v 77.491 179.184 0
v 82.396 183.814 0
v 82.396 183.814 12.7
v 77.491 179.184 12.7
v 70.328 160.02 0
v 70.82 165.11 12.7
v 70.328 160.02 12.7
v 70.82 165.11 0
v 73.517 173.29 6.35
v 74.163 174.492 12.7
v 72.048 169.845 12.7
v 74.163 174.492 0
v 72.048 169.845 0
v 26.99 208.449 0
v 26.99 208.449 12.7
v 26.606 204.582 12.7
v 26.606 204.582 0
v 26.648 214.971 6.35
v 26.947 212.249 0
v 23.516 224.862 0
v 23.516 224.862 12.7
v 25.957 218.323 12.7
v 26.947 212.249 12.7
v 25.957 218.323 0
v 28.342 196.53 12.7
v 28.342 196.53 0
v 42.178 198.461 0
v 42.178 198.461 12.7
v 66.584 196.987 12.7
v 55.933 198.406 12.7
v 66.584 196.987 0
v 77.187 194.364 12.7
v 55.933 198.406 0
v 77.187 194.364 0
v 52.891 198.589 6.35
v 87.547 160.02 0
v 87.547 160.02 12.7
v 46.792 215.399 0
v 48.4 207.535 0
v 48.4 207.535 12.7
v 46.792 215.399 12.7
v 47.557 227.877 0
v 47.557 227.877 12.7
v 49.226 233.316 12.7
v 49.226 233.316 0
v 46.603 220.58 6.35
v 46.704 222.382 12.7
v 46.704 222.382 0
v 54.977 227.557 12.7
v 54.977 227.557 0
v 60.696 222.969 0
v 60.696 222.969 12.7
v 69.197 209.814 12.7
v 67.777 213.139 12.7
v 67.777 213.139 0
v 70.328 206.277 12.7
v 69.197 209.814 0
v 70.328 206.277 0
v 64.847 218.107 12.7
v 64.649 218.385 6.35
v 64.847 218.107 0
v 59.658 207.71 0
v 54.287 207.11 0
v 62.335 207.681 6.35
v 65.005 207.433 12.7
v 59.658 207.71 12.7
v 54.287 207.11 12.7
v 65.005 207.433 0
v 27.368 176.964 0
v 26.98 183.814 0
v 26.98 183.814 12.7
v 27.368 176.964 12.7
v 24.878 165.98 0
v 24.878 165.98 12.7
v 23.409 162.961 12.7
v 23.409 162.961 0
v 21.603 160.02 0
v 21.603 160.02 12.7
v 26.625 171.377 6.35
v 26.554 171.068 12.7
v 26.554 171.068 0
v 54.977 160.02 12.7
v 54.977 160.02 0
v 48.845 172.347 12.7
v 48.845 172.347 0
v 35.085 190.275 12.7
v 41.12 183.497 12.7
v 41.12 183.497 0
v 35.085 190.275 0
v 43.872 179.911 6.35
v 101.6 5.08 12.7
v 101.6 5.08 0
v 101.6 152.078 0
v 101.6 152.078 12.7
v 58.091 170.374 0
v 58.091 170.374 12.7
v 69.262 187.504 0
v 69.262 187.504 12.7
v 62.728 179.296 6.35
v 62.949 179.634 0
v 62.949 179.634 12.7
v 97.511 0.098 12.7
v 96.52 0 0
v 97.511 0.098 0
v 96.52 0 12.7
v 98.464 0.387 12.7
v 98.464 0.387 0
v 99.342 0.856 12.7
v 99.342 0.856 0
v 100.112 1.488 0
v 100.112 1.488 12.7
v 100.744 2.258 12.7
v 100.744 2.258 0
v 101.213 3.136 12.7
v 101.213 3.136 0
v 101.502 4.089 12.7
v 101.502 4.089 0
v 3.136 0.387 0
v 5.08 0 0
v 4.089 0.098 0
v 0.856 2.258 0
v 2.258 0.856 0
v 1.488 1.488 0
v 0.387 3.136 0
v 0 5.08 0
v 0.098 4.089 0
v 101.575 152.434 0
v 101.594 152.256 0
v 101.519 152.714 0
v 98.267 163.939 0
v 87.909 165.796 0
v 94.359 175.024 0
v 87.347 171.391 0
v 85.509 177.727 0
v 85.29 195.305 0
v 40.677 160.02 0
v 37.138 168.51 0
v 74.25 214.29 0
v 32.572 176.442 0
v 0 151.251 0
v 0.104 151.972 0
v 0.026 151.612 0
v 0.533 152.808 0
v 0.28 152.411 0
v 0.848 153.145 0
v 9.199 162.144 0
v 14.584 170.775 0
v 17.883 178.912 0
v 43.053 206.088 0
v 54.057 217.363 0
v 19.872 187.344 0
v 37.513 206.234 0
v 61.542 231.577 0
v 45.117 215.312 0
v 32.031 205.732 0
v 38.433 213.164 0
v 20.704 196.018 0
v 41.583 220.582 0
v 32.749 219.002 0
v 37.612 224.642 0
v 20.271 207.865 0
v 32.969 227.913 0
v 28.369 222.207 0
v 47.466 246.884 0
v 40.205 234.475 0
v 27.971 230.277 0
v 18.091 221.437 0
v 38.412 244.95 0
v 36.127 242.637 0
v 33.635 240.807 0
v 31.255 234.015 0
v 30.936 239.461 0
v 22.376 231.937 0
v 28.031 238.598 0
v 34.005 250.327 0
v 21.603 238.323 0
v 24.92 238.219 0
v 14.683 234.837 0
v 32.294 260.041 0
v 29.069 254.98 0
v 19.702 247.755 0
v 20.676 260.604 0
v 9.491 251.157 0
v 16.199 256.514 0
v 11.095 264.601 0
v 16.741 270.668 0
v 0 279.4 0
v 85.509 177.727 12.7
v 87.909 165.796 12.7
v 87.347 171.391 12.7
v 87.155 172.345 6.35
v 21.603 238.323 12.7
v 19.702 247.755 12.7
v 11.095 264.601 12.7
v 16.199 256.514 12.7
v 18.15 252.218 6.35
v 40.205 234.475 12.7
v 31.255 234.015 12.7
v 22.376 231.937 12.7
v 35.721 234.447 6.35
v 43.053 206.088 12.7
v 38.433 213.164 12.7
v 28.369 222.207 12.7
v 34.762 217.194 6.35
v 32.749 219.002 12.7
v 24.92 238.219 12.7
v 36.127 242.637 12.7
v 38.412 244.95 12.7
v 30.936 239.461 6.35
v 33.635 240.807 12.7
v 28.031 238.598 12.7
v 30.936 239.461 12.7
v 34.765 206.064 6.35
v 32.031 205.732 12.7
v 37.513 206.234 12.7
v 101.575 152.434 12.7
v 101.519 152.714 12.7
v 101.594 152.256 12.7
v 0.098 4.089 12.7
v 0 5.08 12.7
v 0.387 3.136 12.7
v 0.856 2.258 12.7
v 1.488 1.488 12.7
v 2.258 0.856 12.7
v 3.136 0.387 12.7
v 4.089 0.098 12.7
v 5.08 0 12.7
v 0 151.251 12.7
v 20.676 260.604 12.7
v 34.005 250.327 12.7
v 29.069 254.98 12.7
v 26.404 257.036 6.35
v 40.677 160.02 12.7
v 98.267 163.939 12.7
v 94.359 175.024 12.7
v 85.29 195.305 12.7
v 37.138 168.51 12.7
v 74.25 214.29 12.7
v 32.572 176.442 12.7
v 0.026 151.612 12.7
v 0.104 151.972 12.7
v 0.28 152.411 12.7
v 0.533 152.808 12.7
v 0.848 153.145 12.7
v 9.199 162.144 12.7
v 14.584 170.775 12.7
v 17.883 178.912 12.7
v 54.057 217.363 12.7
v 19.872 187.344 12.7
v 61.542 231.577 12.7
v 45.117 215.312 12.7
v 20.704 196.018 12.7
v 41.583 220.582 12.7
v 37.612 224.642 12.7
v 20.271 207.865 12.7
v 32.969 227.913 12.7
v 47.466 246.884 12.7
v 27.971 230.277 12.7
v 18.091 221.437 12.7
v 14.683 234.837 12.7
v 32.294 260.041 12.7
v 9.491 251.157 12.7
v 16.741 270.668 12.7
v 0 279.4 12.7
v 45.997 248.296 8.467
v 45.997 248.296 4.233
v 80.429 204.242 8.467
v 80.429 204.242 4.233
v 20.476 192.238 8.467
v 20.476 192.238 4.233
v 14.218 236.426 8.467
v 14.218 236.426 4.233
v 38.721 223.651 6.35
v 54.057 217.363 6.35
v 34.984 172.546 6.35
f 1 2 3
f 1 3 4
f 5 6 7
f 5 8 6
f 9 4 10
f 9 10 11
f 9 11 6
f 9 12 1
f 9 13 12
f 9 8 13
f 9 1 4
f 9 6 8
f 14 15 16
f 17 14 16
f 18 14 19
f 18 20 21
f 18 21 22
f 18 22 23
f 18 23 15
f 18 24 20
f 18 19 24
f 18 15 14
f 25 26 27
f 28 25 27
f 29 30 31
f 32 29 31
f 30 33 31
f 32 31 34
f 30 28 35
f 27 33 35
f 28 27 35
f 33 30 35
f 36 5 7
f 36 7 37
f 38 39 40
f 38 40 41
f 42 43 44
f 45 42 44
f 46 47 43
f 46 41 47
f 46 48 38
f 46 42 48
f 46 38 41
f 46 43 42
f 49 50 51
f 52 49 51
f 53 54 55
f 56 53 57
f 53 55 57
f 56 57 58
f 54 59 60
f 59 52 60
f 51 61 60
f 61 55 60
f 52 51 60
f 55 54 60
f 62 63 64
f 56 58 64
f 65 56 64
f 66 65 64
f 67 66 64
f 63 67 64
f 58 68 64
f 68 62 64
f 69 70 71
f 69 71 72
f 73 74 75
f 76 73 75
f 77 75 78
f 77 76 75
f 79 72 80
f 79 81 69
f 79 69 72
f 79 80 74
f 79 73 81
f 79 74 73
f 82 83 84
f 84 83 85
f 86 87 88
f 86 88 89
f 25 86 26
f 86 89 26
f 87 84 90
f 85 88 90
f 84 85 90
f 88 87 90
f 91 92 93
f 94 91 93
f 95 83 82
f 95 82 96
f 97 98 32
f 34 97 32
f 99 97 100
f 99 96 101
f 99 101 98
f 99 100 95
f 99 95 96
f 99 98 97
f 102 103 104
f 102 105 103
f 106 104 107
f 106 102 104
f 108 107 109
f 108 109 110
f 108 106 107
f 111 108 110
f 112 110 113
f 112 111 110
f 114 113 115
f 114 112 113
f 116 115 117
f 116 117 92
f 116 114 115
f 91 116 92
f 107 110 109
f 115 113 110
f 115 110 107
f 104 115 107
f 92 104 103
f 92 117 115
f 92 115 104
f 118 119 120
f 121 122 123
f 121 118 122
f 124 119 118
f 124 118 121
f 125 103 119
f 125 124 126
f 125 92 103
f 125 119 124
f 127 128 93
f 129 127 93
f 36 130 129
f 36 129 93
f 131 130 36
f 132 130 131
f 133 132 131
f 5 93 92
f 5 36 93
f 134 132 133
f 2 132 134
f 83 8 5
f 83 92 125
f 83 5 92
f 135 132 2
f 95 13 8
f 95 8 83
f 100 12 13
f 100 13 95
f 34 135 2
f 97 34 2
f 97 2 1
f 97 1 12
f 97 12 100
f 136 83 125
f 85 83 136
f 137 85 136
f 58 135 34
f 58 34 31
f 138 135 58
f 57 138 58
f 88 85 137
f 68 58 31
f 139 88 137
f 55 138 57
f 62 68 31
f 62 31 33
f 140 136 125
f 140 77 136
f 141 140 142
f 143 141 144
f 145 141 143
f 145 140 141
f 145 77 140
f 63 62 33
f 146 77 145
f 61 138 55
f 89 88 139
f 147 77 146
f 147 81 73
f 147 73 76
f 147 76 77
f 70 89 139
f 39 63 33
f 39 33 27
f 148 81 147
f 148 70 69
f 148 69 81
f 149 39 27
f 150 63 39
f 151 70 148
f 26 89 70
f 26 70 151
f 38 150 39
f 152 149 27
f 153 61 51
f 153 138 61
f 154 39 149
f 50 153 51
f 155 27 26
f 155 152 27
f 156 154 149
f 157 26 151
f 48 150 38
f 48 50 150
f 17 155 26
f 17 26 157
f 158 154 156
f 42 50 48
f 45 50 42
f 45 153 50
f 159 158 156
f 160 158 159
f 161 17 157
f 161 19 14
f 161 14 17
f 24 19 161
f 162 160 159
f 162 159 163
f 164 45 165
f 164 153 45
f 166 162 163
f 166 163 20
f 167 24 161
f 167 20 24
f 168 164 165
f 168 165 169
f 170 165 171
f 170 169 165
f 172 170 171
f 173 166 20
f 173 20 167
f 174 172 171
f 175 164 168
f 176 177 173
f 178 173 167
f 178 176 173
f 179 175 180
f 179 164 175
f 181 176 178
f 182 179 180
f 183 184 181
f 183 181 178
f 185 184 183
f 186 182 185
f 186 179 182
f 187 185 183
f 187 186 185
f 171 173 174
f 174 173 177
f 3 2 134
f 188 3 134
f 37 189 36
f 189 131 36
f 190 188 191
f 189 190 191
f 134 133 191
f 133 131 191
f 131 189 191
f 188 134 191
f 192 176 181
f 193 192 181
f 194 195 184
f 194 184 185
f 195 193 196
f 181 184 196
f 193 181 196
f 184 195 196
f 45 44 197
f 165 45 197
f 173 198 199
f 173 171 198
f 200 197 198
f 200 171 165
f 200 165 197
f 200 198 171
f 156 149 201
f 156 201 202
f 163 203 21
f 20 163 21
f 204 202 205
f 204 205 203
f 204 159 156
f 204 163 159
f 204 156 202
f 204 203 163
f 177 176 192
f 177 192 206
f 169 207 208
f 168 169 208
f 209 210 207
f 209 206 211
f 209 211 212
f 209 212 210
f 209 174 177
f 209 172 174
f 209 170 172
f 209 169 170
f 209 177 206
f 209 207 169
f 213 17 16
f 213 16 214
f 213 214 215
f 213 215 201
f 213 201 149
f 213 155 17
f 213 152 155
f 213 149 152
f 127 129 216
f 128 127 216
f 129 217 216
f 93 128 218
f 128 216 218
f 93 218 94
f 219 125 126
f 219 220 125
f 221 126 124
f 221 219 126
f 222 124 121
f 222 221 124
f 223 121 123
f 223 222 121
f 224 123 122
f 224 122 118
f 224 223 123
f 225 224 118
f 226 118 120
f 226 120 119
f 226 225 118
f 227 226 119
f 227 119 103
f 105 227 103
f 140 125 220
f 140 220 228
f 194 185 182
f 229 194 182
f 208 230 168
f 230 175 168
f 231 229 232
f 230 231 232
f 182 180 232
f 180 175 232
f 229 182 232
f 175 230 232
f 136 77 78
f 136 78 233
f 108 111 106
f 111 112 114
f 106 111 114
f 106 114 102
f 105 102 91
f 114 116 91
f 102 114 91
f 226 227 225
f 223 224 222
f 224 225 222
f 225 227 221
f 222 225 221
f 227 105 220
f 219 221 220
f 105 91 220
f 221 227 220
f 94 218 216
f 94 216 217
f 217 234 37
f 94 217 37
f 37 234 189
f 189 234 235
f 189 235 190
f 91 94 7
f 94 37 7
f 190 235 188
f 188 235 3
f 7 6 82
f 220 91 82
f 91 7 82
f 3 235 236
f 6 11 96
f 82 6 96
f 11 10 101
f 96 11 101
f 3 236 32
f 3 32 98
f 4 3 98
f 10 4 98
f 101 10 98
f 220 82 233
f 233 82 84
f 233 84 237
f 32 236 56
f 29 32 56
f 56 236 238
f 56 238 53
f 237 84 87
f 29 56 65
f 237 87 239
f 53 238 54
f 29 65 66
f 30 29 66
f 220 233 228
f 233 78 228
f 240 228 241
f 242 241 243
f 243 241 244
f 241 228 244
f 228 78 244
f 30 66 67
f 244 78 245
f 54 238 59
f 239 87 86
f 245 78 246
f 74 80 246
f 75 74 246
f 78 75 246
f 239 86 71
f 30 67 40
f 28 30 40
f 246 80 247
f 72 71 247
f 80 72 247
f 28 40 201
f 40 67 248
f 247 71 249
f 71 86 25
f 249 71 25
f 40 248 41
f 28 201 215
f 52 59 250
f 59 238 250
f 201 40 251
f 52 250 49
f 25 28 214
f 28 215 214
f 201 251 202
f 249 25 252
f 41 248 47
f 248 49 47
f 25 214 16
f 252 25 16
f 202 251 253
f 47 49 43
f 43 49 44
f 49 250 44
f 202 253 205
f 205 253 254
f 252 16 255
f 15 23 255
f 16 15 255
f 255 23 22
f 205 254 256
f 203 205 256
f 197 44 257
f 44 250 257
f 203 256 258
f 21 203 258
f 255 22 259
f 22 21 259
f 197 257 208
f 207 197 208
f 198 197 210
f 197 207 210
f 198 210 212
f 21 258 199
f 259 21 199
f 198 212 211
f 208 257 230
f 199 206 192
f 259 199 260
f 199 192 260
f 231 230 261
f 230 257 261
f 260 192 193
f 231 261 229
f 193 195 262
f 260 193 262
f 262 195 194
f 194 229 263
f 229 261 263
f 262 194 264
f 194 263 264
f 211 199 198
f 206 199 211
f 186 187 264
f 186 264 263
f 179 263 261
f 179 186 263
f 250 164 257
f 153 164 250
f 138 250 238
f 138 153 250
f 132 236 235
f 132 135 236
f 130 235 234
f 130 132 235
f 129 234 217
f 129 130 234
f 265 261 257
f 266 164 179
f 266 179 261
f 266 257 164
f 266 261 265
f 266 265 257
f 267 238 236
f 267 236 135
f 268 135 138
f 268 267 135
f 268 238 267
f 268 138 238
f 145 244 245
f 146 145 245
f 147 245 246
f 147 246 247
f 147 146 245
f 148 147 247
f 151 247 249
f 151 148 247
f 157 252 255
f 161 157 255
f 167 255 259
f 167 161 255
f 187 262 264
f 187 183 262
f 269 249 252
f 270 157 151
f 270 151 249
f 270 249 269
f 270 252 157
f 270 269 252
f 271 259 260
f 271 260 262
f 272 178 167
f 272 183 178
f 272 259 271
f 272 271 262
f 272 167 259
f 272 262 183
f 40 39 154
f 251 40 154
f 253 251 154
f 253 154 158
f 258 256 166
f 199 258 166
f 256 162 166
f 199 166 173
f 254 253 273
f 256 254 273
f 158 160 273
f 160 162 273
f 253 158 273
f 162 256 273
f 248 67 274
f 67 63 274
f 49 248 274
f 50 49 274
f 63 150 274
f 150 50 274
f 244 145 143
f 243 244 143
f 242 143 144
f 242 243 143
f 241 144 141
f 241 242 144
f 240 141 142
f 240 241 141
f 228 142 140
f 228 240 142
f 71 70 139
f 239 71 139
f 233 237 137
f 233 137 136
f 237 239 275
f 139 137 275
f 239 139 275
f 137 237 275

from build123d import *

# Parameters (mm, degrees)
SKETCH1_W           = 101.6
SKETCH1_H           = 152.4
BOSS_EXTRUDE1_DEPTH = 12.7
BOSS_EXTRUDE3_DEPTH = 12.7
FILLET1_R           = 2.54
FILLET2_R           = 5.08


with BuildPart() as part:
    # Sketch1 → Boss-Extrude1 (new body)
    with BuildSketch(Plane.XY):
        with Locations((50.8, 76.2)):
            Rectangle(SKETCH1_W, SKETCH1_H)
    extrude(amount=BOSS_EXTRUDE1_DEPTH)

    # Sketch2 → Boss-Extrude3 (add)
    with BuildSketch(Plane.XY):
        with BuildLine():
            add(Edge.make_bspline(
                [(0, 152.4), (39.790111277, 186.839065643), (12.30975625, 238.845497073), (0, 279.4)],
                knots=[0, 0, 0, 0, 1, 1, 1, 1], degree=3))
            add(Edge.make_bspline(
                [(0, 279.4), (51.286050257, 256.550041835), (87.836892382, 205.957944637), (101.6, 152.4)],
                knots=[0, 0, 0, 0, 1, 1, 1, 1], degree=3))
            Line((101.6, 152.4), (0, 152.4))
        make_face()
        with BuildLine():
            add(Edge.make_bspline(
                [(49.225838487, 233.315766274), (35.641228944, 236.267866949), (22.375615267, 231.937259722)],
                knots=[0, 0, 0, 1, 1, 1], degree=2))
            add(Edge.make_bspline(
                [(48.400350721, 207.535437601), (42.054170901, 227.566198031), (22.375615267, 231.937259722)],
                knots=[0, 0, 0, 1, 1, 1], degree=2))
            add(Edge.make_bspline(
                [(48.400350721, 207.535437601), (44.393568943, 220.734513873), (49.225838487, 233.315766274)],
                knots=[0, 0, 0, 1, 1, 1], degree=2))
        make_face(mode=Mode.SUBTRACT)
        with BuildLine():
            add(Edge.make_bspline(
                [(43.05348098, 206.08803494), (36.239789994, 218.91266054), (23.516066372, 224.861937296)],
                knots=[0, 0, 0, 1, 1, 1], degree=2))
            add(Edge.make_bspline(
                [(23.516066372, 224.861937296), (28.235295407, 215.21927262), (26.605728117, 204.582177714)],
                knots=[0, 0, 0, 1, 1, 1], degree=2))
            add(Edge.make_bspline(
                [(26.605728117, 204.582177714), (34.700432609, 206.792891754), (43.05348098, 206.08803494)],
                knots=[0, 0, 0, 1, 1, 1], degree=2))
        make_face(mode=Mode.SUBTRACT)
        with BuildLine():
            add(Edge.make_bspline(
                [(82.396089655, 183.81371778), (70.6713649, 174.663598784), (70.32777317, 160.02)],
                knots=[0, 0, 0, 1, 1, 1], degree=2))
            Line((70.32777317, 160.02), (87.546521436, 160.02))
            add(Edge.make_bspline(
                [(82.396089655, 183.81371778), (89.339550367, 172.773814043), (87.546521436, 160.02)],
                knots=[0, 0, 0, 1, 1, 1], degree=2))
        make_face(mode=Mode.SUBTRACT)
        with BuildLine():
            add(Edge.make_bspline(
                [(26.980466376, 183.81374211), (28.958775605, 170.837543608), (21.602944743, 160.02)],
                knots=[0, 0, 0, 1, 1, 1], degree=2))
            Line((21.602944743, 160.02), (40.676641776, 160.02))
            add(Edge.make_bspline(
                [(26.980466376, 183.81374211), (36.13847285, 173.175056715), (40.676641776, 160.02)],
                knots=[0, 0, 0, 1, 1, 1], degree=2))
        make_face(mode=Mode.SUBTRACT)
        with BuildLine():
            add(Edge.make_bspline(
                [(54.97708308, 160.02), (46.08347584, 181.54755316), (28.342136903, 196.529802482)],
                knots=[0, 0, 0, 1, 1, 1], degree=2))
            add(Edge.make_bspline(
                [(28.342136903, 196.529802482), (53.017815002, 201.732288521), (77.187204495, 194.363538628)],
                knots=[0, 0, 0, 1, 1, 1], degree=2))
            add(Edge.make_bspline(
                [(54.97708308, 160.02), (59.374728895, 181.400643158), (77.187204495, 194.363538628)],
                knots=[0, 0, 0, 1, 1, 1], degree=2))
        make_face(mode=Mode.SUBTRACT)
        with BuildLine():
            add(Edge.make_bspline(
                [(70.328259561, 206.277457578), (62.361576962, 208.669014941), (54.287141362, 207.109917469)],
                knots=[0, 0, 0, 1, 1, 1], degree=2))
            add(Edge.make_bspline(
                [(54.287141362, 207.109917469), (53.482096811, 217.391663167), (54.97708308, 227.557269012)],
                knots=[0, 0, 0, 1, 1, 1], degree=2))
            add(Edge.make_bspline(
                [(54.97708308, 227.557269012), (66.645859754, 219.852180834), (70.328259561, 206.277457578)],
                knots=[0, 0, 0, 1, 1, 1], degree=2))
        make_face(mode=Mode.SUBTRACT)
        with BuildLine():
            add(Edge.make_bspline(
                [(21.602944743, 238.323137826), (19.95197567, 252.974545225), (11.094737768, 264.601494061)],
                knots=[0, 0, 0, 1, 1, 1], degree=2))
            add(Edge.make_bspline(
                [(11.094737768, 264.601494061), (28.053835186, 259.295838115), (38.412267282, 244.949944056)],
                knots=[0, 0, 0, 1, 1, 1], degree=2))
            add(Edge.make_bspline(
                [(21.602944743, 238.323137826), (31.864782779, 237.284469605), (38.412267282, 244.949944056)],
                knots=[0, 0, 0, 1, 1, 1], degree=2))
        make_face(mode=Mode.SUBTRACT)
    extrude(amount=BOSS_EXTRUDE3_DEPTH)

    # Fillet1
    fillet1_edges = [part.edges().sort_by_distance(p)[0] for p in [
        (101.6, 152.4, 6.35),
        (0, 152.4, 6.35),
    ]]
    fillet(fillet1_edges, radius=FILLET1_R)

    # Fillet2
    fillet2_edges = [part.edges().sort_by_distance(p)[0] for p in [
        (0, 0, 6.35),
        (101.6, 0, 6.35),
    ]]
    fillet(fillet2_edges, radius=FILLET2_R)


solid = part.part
